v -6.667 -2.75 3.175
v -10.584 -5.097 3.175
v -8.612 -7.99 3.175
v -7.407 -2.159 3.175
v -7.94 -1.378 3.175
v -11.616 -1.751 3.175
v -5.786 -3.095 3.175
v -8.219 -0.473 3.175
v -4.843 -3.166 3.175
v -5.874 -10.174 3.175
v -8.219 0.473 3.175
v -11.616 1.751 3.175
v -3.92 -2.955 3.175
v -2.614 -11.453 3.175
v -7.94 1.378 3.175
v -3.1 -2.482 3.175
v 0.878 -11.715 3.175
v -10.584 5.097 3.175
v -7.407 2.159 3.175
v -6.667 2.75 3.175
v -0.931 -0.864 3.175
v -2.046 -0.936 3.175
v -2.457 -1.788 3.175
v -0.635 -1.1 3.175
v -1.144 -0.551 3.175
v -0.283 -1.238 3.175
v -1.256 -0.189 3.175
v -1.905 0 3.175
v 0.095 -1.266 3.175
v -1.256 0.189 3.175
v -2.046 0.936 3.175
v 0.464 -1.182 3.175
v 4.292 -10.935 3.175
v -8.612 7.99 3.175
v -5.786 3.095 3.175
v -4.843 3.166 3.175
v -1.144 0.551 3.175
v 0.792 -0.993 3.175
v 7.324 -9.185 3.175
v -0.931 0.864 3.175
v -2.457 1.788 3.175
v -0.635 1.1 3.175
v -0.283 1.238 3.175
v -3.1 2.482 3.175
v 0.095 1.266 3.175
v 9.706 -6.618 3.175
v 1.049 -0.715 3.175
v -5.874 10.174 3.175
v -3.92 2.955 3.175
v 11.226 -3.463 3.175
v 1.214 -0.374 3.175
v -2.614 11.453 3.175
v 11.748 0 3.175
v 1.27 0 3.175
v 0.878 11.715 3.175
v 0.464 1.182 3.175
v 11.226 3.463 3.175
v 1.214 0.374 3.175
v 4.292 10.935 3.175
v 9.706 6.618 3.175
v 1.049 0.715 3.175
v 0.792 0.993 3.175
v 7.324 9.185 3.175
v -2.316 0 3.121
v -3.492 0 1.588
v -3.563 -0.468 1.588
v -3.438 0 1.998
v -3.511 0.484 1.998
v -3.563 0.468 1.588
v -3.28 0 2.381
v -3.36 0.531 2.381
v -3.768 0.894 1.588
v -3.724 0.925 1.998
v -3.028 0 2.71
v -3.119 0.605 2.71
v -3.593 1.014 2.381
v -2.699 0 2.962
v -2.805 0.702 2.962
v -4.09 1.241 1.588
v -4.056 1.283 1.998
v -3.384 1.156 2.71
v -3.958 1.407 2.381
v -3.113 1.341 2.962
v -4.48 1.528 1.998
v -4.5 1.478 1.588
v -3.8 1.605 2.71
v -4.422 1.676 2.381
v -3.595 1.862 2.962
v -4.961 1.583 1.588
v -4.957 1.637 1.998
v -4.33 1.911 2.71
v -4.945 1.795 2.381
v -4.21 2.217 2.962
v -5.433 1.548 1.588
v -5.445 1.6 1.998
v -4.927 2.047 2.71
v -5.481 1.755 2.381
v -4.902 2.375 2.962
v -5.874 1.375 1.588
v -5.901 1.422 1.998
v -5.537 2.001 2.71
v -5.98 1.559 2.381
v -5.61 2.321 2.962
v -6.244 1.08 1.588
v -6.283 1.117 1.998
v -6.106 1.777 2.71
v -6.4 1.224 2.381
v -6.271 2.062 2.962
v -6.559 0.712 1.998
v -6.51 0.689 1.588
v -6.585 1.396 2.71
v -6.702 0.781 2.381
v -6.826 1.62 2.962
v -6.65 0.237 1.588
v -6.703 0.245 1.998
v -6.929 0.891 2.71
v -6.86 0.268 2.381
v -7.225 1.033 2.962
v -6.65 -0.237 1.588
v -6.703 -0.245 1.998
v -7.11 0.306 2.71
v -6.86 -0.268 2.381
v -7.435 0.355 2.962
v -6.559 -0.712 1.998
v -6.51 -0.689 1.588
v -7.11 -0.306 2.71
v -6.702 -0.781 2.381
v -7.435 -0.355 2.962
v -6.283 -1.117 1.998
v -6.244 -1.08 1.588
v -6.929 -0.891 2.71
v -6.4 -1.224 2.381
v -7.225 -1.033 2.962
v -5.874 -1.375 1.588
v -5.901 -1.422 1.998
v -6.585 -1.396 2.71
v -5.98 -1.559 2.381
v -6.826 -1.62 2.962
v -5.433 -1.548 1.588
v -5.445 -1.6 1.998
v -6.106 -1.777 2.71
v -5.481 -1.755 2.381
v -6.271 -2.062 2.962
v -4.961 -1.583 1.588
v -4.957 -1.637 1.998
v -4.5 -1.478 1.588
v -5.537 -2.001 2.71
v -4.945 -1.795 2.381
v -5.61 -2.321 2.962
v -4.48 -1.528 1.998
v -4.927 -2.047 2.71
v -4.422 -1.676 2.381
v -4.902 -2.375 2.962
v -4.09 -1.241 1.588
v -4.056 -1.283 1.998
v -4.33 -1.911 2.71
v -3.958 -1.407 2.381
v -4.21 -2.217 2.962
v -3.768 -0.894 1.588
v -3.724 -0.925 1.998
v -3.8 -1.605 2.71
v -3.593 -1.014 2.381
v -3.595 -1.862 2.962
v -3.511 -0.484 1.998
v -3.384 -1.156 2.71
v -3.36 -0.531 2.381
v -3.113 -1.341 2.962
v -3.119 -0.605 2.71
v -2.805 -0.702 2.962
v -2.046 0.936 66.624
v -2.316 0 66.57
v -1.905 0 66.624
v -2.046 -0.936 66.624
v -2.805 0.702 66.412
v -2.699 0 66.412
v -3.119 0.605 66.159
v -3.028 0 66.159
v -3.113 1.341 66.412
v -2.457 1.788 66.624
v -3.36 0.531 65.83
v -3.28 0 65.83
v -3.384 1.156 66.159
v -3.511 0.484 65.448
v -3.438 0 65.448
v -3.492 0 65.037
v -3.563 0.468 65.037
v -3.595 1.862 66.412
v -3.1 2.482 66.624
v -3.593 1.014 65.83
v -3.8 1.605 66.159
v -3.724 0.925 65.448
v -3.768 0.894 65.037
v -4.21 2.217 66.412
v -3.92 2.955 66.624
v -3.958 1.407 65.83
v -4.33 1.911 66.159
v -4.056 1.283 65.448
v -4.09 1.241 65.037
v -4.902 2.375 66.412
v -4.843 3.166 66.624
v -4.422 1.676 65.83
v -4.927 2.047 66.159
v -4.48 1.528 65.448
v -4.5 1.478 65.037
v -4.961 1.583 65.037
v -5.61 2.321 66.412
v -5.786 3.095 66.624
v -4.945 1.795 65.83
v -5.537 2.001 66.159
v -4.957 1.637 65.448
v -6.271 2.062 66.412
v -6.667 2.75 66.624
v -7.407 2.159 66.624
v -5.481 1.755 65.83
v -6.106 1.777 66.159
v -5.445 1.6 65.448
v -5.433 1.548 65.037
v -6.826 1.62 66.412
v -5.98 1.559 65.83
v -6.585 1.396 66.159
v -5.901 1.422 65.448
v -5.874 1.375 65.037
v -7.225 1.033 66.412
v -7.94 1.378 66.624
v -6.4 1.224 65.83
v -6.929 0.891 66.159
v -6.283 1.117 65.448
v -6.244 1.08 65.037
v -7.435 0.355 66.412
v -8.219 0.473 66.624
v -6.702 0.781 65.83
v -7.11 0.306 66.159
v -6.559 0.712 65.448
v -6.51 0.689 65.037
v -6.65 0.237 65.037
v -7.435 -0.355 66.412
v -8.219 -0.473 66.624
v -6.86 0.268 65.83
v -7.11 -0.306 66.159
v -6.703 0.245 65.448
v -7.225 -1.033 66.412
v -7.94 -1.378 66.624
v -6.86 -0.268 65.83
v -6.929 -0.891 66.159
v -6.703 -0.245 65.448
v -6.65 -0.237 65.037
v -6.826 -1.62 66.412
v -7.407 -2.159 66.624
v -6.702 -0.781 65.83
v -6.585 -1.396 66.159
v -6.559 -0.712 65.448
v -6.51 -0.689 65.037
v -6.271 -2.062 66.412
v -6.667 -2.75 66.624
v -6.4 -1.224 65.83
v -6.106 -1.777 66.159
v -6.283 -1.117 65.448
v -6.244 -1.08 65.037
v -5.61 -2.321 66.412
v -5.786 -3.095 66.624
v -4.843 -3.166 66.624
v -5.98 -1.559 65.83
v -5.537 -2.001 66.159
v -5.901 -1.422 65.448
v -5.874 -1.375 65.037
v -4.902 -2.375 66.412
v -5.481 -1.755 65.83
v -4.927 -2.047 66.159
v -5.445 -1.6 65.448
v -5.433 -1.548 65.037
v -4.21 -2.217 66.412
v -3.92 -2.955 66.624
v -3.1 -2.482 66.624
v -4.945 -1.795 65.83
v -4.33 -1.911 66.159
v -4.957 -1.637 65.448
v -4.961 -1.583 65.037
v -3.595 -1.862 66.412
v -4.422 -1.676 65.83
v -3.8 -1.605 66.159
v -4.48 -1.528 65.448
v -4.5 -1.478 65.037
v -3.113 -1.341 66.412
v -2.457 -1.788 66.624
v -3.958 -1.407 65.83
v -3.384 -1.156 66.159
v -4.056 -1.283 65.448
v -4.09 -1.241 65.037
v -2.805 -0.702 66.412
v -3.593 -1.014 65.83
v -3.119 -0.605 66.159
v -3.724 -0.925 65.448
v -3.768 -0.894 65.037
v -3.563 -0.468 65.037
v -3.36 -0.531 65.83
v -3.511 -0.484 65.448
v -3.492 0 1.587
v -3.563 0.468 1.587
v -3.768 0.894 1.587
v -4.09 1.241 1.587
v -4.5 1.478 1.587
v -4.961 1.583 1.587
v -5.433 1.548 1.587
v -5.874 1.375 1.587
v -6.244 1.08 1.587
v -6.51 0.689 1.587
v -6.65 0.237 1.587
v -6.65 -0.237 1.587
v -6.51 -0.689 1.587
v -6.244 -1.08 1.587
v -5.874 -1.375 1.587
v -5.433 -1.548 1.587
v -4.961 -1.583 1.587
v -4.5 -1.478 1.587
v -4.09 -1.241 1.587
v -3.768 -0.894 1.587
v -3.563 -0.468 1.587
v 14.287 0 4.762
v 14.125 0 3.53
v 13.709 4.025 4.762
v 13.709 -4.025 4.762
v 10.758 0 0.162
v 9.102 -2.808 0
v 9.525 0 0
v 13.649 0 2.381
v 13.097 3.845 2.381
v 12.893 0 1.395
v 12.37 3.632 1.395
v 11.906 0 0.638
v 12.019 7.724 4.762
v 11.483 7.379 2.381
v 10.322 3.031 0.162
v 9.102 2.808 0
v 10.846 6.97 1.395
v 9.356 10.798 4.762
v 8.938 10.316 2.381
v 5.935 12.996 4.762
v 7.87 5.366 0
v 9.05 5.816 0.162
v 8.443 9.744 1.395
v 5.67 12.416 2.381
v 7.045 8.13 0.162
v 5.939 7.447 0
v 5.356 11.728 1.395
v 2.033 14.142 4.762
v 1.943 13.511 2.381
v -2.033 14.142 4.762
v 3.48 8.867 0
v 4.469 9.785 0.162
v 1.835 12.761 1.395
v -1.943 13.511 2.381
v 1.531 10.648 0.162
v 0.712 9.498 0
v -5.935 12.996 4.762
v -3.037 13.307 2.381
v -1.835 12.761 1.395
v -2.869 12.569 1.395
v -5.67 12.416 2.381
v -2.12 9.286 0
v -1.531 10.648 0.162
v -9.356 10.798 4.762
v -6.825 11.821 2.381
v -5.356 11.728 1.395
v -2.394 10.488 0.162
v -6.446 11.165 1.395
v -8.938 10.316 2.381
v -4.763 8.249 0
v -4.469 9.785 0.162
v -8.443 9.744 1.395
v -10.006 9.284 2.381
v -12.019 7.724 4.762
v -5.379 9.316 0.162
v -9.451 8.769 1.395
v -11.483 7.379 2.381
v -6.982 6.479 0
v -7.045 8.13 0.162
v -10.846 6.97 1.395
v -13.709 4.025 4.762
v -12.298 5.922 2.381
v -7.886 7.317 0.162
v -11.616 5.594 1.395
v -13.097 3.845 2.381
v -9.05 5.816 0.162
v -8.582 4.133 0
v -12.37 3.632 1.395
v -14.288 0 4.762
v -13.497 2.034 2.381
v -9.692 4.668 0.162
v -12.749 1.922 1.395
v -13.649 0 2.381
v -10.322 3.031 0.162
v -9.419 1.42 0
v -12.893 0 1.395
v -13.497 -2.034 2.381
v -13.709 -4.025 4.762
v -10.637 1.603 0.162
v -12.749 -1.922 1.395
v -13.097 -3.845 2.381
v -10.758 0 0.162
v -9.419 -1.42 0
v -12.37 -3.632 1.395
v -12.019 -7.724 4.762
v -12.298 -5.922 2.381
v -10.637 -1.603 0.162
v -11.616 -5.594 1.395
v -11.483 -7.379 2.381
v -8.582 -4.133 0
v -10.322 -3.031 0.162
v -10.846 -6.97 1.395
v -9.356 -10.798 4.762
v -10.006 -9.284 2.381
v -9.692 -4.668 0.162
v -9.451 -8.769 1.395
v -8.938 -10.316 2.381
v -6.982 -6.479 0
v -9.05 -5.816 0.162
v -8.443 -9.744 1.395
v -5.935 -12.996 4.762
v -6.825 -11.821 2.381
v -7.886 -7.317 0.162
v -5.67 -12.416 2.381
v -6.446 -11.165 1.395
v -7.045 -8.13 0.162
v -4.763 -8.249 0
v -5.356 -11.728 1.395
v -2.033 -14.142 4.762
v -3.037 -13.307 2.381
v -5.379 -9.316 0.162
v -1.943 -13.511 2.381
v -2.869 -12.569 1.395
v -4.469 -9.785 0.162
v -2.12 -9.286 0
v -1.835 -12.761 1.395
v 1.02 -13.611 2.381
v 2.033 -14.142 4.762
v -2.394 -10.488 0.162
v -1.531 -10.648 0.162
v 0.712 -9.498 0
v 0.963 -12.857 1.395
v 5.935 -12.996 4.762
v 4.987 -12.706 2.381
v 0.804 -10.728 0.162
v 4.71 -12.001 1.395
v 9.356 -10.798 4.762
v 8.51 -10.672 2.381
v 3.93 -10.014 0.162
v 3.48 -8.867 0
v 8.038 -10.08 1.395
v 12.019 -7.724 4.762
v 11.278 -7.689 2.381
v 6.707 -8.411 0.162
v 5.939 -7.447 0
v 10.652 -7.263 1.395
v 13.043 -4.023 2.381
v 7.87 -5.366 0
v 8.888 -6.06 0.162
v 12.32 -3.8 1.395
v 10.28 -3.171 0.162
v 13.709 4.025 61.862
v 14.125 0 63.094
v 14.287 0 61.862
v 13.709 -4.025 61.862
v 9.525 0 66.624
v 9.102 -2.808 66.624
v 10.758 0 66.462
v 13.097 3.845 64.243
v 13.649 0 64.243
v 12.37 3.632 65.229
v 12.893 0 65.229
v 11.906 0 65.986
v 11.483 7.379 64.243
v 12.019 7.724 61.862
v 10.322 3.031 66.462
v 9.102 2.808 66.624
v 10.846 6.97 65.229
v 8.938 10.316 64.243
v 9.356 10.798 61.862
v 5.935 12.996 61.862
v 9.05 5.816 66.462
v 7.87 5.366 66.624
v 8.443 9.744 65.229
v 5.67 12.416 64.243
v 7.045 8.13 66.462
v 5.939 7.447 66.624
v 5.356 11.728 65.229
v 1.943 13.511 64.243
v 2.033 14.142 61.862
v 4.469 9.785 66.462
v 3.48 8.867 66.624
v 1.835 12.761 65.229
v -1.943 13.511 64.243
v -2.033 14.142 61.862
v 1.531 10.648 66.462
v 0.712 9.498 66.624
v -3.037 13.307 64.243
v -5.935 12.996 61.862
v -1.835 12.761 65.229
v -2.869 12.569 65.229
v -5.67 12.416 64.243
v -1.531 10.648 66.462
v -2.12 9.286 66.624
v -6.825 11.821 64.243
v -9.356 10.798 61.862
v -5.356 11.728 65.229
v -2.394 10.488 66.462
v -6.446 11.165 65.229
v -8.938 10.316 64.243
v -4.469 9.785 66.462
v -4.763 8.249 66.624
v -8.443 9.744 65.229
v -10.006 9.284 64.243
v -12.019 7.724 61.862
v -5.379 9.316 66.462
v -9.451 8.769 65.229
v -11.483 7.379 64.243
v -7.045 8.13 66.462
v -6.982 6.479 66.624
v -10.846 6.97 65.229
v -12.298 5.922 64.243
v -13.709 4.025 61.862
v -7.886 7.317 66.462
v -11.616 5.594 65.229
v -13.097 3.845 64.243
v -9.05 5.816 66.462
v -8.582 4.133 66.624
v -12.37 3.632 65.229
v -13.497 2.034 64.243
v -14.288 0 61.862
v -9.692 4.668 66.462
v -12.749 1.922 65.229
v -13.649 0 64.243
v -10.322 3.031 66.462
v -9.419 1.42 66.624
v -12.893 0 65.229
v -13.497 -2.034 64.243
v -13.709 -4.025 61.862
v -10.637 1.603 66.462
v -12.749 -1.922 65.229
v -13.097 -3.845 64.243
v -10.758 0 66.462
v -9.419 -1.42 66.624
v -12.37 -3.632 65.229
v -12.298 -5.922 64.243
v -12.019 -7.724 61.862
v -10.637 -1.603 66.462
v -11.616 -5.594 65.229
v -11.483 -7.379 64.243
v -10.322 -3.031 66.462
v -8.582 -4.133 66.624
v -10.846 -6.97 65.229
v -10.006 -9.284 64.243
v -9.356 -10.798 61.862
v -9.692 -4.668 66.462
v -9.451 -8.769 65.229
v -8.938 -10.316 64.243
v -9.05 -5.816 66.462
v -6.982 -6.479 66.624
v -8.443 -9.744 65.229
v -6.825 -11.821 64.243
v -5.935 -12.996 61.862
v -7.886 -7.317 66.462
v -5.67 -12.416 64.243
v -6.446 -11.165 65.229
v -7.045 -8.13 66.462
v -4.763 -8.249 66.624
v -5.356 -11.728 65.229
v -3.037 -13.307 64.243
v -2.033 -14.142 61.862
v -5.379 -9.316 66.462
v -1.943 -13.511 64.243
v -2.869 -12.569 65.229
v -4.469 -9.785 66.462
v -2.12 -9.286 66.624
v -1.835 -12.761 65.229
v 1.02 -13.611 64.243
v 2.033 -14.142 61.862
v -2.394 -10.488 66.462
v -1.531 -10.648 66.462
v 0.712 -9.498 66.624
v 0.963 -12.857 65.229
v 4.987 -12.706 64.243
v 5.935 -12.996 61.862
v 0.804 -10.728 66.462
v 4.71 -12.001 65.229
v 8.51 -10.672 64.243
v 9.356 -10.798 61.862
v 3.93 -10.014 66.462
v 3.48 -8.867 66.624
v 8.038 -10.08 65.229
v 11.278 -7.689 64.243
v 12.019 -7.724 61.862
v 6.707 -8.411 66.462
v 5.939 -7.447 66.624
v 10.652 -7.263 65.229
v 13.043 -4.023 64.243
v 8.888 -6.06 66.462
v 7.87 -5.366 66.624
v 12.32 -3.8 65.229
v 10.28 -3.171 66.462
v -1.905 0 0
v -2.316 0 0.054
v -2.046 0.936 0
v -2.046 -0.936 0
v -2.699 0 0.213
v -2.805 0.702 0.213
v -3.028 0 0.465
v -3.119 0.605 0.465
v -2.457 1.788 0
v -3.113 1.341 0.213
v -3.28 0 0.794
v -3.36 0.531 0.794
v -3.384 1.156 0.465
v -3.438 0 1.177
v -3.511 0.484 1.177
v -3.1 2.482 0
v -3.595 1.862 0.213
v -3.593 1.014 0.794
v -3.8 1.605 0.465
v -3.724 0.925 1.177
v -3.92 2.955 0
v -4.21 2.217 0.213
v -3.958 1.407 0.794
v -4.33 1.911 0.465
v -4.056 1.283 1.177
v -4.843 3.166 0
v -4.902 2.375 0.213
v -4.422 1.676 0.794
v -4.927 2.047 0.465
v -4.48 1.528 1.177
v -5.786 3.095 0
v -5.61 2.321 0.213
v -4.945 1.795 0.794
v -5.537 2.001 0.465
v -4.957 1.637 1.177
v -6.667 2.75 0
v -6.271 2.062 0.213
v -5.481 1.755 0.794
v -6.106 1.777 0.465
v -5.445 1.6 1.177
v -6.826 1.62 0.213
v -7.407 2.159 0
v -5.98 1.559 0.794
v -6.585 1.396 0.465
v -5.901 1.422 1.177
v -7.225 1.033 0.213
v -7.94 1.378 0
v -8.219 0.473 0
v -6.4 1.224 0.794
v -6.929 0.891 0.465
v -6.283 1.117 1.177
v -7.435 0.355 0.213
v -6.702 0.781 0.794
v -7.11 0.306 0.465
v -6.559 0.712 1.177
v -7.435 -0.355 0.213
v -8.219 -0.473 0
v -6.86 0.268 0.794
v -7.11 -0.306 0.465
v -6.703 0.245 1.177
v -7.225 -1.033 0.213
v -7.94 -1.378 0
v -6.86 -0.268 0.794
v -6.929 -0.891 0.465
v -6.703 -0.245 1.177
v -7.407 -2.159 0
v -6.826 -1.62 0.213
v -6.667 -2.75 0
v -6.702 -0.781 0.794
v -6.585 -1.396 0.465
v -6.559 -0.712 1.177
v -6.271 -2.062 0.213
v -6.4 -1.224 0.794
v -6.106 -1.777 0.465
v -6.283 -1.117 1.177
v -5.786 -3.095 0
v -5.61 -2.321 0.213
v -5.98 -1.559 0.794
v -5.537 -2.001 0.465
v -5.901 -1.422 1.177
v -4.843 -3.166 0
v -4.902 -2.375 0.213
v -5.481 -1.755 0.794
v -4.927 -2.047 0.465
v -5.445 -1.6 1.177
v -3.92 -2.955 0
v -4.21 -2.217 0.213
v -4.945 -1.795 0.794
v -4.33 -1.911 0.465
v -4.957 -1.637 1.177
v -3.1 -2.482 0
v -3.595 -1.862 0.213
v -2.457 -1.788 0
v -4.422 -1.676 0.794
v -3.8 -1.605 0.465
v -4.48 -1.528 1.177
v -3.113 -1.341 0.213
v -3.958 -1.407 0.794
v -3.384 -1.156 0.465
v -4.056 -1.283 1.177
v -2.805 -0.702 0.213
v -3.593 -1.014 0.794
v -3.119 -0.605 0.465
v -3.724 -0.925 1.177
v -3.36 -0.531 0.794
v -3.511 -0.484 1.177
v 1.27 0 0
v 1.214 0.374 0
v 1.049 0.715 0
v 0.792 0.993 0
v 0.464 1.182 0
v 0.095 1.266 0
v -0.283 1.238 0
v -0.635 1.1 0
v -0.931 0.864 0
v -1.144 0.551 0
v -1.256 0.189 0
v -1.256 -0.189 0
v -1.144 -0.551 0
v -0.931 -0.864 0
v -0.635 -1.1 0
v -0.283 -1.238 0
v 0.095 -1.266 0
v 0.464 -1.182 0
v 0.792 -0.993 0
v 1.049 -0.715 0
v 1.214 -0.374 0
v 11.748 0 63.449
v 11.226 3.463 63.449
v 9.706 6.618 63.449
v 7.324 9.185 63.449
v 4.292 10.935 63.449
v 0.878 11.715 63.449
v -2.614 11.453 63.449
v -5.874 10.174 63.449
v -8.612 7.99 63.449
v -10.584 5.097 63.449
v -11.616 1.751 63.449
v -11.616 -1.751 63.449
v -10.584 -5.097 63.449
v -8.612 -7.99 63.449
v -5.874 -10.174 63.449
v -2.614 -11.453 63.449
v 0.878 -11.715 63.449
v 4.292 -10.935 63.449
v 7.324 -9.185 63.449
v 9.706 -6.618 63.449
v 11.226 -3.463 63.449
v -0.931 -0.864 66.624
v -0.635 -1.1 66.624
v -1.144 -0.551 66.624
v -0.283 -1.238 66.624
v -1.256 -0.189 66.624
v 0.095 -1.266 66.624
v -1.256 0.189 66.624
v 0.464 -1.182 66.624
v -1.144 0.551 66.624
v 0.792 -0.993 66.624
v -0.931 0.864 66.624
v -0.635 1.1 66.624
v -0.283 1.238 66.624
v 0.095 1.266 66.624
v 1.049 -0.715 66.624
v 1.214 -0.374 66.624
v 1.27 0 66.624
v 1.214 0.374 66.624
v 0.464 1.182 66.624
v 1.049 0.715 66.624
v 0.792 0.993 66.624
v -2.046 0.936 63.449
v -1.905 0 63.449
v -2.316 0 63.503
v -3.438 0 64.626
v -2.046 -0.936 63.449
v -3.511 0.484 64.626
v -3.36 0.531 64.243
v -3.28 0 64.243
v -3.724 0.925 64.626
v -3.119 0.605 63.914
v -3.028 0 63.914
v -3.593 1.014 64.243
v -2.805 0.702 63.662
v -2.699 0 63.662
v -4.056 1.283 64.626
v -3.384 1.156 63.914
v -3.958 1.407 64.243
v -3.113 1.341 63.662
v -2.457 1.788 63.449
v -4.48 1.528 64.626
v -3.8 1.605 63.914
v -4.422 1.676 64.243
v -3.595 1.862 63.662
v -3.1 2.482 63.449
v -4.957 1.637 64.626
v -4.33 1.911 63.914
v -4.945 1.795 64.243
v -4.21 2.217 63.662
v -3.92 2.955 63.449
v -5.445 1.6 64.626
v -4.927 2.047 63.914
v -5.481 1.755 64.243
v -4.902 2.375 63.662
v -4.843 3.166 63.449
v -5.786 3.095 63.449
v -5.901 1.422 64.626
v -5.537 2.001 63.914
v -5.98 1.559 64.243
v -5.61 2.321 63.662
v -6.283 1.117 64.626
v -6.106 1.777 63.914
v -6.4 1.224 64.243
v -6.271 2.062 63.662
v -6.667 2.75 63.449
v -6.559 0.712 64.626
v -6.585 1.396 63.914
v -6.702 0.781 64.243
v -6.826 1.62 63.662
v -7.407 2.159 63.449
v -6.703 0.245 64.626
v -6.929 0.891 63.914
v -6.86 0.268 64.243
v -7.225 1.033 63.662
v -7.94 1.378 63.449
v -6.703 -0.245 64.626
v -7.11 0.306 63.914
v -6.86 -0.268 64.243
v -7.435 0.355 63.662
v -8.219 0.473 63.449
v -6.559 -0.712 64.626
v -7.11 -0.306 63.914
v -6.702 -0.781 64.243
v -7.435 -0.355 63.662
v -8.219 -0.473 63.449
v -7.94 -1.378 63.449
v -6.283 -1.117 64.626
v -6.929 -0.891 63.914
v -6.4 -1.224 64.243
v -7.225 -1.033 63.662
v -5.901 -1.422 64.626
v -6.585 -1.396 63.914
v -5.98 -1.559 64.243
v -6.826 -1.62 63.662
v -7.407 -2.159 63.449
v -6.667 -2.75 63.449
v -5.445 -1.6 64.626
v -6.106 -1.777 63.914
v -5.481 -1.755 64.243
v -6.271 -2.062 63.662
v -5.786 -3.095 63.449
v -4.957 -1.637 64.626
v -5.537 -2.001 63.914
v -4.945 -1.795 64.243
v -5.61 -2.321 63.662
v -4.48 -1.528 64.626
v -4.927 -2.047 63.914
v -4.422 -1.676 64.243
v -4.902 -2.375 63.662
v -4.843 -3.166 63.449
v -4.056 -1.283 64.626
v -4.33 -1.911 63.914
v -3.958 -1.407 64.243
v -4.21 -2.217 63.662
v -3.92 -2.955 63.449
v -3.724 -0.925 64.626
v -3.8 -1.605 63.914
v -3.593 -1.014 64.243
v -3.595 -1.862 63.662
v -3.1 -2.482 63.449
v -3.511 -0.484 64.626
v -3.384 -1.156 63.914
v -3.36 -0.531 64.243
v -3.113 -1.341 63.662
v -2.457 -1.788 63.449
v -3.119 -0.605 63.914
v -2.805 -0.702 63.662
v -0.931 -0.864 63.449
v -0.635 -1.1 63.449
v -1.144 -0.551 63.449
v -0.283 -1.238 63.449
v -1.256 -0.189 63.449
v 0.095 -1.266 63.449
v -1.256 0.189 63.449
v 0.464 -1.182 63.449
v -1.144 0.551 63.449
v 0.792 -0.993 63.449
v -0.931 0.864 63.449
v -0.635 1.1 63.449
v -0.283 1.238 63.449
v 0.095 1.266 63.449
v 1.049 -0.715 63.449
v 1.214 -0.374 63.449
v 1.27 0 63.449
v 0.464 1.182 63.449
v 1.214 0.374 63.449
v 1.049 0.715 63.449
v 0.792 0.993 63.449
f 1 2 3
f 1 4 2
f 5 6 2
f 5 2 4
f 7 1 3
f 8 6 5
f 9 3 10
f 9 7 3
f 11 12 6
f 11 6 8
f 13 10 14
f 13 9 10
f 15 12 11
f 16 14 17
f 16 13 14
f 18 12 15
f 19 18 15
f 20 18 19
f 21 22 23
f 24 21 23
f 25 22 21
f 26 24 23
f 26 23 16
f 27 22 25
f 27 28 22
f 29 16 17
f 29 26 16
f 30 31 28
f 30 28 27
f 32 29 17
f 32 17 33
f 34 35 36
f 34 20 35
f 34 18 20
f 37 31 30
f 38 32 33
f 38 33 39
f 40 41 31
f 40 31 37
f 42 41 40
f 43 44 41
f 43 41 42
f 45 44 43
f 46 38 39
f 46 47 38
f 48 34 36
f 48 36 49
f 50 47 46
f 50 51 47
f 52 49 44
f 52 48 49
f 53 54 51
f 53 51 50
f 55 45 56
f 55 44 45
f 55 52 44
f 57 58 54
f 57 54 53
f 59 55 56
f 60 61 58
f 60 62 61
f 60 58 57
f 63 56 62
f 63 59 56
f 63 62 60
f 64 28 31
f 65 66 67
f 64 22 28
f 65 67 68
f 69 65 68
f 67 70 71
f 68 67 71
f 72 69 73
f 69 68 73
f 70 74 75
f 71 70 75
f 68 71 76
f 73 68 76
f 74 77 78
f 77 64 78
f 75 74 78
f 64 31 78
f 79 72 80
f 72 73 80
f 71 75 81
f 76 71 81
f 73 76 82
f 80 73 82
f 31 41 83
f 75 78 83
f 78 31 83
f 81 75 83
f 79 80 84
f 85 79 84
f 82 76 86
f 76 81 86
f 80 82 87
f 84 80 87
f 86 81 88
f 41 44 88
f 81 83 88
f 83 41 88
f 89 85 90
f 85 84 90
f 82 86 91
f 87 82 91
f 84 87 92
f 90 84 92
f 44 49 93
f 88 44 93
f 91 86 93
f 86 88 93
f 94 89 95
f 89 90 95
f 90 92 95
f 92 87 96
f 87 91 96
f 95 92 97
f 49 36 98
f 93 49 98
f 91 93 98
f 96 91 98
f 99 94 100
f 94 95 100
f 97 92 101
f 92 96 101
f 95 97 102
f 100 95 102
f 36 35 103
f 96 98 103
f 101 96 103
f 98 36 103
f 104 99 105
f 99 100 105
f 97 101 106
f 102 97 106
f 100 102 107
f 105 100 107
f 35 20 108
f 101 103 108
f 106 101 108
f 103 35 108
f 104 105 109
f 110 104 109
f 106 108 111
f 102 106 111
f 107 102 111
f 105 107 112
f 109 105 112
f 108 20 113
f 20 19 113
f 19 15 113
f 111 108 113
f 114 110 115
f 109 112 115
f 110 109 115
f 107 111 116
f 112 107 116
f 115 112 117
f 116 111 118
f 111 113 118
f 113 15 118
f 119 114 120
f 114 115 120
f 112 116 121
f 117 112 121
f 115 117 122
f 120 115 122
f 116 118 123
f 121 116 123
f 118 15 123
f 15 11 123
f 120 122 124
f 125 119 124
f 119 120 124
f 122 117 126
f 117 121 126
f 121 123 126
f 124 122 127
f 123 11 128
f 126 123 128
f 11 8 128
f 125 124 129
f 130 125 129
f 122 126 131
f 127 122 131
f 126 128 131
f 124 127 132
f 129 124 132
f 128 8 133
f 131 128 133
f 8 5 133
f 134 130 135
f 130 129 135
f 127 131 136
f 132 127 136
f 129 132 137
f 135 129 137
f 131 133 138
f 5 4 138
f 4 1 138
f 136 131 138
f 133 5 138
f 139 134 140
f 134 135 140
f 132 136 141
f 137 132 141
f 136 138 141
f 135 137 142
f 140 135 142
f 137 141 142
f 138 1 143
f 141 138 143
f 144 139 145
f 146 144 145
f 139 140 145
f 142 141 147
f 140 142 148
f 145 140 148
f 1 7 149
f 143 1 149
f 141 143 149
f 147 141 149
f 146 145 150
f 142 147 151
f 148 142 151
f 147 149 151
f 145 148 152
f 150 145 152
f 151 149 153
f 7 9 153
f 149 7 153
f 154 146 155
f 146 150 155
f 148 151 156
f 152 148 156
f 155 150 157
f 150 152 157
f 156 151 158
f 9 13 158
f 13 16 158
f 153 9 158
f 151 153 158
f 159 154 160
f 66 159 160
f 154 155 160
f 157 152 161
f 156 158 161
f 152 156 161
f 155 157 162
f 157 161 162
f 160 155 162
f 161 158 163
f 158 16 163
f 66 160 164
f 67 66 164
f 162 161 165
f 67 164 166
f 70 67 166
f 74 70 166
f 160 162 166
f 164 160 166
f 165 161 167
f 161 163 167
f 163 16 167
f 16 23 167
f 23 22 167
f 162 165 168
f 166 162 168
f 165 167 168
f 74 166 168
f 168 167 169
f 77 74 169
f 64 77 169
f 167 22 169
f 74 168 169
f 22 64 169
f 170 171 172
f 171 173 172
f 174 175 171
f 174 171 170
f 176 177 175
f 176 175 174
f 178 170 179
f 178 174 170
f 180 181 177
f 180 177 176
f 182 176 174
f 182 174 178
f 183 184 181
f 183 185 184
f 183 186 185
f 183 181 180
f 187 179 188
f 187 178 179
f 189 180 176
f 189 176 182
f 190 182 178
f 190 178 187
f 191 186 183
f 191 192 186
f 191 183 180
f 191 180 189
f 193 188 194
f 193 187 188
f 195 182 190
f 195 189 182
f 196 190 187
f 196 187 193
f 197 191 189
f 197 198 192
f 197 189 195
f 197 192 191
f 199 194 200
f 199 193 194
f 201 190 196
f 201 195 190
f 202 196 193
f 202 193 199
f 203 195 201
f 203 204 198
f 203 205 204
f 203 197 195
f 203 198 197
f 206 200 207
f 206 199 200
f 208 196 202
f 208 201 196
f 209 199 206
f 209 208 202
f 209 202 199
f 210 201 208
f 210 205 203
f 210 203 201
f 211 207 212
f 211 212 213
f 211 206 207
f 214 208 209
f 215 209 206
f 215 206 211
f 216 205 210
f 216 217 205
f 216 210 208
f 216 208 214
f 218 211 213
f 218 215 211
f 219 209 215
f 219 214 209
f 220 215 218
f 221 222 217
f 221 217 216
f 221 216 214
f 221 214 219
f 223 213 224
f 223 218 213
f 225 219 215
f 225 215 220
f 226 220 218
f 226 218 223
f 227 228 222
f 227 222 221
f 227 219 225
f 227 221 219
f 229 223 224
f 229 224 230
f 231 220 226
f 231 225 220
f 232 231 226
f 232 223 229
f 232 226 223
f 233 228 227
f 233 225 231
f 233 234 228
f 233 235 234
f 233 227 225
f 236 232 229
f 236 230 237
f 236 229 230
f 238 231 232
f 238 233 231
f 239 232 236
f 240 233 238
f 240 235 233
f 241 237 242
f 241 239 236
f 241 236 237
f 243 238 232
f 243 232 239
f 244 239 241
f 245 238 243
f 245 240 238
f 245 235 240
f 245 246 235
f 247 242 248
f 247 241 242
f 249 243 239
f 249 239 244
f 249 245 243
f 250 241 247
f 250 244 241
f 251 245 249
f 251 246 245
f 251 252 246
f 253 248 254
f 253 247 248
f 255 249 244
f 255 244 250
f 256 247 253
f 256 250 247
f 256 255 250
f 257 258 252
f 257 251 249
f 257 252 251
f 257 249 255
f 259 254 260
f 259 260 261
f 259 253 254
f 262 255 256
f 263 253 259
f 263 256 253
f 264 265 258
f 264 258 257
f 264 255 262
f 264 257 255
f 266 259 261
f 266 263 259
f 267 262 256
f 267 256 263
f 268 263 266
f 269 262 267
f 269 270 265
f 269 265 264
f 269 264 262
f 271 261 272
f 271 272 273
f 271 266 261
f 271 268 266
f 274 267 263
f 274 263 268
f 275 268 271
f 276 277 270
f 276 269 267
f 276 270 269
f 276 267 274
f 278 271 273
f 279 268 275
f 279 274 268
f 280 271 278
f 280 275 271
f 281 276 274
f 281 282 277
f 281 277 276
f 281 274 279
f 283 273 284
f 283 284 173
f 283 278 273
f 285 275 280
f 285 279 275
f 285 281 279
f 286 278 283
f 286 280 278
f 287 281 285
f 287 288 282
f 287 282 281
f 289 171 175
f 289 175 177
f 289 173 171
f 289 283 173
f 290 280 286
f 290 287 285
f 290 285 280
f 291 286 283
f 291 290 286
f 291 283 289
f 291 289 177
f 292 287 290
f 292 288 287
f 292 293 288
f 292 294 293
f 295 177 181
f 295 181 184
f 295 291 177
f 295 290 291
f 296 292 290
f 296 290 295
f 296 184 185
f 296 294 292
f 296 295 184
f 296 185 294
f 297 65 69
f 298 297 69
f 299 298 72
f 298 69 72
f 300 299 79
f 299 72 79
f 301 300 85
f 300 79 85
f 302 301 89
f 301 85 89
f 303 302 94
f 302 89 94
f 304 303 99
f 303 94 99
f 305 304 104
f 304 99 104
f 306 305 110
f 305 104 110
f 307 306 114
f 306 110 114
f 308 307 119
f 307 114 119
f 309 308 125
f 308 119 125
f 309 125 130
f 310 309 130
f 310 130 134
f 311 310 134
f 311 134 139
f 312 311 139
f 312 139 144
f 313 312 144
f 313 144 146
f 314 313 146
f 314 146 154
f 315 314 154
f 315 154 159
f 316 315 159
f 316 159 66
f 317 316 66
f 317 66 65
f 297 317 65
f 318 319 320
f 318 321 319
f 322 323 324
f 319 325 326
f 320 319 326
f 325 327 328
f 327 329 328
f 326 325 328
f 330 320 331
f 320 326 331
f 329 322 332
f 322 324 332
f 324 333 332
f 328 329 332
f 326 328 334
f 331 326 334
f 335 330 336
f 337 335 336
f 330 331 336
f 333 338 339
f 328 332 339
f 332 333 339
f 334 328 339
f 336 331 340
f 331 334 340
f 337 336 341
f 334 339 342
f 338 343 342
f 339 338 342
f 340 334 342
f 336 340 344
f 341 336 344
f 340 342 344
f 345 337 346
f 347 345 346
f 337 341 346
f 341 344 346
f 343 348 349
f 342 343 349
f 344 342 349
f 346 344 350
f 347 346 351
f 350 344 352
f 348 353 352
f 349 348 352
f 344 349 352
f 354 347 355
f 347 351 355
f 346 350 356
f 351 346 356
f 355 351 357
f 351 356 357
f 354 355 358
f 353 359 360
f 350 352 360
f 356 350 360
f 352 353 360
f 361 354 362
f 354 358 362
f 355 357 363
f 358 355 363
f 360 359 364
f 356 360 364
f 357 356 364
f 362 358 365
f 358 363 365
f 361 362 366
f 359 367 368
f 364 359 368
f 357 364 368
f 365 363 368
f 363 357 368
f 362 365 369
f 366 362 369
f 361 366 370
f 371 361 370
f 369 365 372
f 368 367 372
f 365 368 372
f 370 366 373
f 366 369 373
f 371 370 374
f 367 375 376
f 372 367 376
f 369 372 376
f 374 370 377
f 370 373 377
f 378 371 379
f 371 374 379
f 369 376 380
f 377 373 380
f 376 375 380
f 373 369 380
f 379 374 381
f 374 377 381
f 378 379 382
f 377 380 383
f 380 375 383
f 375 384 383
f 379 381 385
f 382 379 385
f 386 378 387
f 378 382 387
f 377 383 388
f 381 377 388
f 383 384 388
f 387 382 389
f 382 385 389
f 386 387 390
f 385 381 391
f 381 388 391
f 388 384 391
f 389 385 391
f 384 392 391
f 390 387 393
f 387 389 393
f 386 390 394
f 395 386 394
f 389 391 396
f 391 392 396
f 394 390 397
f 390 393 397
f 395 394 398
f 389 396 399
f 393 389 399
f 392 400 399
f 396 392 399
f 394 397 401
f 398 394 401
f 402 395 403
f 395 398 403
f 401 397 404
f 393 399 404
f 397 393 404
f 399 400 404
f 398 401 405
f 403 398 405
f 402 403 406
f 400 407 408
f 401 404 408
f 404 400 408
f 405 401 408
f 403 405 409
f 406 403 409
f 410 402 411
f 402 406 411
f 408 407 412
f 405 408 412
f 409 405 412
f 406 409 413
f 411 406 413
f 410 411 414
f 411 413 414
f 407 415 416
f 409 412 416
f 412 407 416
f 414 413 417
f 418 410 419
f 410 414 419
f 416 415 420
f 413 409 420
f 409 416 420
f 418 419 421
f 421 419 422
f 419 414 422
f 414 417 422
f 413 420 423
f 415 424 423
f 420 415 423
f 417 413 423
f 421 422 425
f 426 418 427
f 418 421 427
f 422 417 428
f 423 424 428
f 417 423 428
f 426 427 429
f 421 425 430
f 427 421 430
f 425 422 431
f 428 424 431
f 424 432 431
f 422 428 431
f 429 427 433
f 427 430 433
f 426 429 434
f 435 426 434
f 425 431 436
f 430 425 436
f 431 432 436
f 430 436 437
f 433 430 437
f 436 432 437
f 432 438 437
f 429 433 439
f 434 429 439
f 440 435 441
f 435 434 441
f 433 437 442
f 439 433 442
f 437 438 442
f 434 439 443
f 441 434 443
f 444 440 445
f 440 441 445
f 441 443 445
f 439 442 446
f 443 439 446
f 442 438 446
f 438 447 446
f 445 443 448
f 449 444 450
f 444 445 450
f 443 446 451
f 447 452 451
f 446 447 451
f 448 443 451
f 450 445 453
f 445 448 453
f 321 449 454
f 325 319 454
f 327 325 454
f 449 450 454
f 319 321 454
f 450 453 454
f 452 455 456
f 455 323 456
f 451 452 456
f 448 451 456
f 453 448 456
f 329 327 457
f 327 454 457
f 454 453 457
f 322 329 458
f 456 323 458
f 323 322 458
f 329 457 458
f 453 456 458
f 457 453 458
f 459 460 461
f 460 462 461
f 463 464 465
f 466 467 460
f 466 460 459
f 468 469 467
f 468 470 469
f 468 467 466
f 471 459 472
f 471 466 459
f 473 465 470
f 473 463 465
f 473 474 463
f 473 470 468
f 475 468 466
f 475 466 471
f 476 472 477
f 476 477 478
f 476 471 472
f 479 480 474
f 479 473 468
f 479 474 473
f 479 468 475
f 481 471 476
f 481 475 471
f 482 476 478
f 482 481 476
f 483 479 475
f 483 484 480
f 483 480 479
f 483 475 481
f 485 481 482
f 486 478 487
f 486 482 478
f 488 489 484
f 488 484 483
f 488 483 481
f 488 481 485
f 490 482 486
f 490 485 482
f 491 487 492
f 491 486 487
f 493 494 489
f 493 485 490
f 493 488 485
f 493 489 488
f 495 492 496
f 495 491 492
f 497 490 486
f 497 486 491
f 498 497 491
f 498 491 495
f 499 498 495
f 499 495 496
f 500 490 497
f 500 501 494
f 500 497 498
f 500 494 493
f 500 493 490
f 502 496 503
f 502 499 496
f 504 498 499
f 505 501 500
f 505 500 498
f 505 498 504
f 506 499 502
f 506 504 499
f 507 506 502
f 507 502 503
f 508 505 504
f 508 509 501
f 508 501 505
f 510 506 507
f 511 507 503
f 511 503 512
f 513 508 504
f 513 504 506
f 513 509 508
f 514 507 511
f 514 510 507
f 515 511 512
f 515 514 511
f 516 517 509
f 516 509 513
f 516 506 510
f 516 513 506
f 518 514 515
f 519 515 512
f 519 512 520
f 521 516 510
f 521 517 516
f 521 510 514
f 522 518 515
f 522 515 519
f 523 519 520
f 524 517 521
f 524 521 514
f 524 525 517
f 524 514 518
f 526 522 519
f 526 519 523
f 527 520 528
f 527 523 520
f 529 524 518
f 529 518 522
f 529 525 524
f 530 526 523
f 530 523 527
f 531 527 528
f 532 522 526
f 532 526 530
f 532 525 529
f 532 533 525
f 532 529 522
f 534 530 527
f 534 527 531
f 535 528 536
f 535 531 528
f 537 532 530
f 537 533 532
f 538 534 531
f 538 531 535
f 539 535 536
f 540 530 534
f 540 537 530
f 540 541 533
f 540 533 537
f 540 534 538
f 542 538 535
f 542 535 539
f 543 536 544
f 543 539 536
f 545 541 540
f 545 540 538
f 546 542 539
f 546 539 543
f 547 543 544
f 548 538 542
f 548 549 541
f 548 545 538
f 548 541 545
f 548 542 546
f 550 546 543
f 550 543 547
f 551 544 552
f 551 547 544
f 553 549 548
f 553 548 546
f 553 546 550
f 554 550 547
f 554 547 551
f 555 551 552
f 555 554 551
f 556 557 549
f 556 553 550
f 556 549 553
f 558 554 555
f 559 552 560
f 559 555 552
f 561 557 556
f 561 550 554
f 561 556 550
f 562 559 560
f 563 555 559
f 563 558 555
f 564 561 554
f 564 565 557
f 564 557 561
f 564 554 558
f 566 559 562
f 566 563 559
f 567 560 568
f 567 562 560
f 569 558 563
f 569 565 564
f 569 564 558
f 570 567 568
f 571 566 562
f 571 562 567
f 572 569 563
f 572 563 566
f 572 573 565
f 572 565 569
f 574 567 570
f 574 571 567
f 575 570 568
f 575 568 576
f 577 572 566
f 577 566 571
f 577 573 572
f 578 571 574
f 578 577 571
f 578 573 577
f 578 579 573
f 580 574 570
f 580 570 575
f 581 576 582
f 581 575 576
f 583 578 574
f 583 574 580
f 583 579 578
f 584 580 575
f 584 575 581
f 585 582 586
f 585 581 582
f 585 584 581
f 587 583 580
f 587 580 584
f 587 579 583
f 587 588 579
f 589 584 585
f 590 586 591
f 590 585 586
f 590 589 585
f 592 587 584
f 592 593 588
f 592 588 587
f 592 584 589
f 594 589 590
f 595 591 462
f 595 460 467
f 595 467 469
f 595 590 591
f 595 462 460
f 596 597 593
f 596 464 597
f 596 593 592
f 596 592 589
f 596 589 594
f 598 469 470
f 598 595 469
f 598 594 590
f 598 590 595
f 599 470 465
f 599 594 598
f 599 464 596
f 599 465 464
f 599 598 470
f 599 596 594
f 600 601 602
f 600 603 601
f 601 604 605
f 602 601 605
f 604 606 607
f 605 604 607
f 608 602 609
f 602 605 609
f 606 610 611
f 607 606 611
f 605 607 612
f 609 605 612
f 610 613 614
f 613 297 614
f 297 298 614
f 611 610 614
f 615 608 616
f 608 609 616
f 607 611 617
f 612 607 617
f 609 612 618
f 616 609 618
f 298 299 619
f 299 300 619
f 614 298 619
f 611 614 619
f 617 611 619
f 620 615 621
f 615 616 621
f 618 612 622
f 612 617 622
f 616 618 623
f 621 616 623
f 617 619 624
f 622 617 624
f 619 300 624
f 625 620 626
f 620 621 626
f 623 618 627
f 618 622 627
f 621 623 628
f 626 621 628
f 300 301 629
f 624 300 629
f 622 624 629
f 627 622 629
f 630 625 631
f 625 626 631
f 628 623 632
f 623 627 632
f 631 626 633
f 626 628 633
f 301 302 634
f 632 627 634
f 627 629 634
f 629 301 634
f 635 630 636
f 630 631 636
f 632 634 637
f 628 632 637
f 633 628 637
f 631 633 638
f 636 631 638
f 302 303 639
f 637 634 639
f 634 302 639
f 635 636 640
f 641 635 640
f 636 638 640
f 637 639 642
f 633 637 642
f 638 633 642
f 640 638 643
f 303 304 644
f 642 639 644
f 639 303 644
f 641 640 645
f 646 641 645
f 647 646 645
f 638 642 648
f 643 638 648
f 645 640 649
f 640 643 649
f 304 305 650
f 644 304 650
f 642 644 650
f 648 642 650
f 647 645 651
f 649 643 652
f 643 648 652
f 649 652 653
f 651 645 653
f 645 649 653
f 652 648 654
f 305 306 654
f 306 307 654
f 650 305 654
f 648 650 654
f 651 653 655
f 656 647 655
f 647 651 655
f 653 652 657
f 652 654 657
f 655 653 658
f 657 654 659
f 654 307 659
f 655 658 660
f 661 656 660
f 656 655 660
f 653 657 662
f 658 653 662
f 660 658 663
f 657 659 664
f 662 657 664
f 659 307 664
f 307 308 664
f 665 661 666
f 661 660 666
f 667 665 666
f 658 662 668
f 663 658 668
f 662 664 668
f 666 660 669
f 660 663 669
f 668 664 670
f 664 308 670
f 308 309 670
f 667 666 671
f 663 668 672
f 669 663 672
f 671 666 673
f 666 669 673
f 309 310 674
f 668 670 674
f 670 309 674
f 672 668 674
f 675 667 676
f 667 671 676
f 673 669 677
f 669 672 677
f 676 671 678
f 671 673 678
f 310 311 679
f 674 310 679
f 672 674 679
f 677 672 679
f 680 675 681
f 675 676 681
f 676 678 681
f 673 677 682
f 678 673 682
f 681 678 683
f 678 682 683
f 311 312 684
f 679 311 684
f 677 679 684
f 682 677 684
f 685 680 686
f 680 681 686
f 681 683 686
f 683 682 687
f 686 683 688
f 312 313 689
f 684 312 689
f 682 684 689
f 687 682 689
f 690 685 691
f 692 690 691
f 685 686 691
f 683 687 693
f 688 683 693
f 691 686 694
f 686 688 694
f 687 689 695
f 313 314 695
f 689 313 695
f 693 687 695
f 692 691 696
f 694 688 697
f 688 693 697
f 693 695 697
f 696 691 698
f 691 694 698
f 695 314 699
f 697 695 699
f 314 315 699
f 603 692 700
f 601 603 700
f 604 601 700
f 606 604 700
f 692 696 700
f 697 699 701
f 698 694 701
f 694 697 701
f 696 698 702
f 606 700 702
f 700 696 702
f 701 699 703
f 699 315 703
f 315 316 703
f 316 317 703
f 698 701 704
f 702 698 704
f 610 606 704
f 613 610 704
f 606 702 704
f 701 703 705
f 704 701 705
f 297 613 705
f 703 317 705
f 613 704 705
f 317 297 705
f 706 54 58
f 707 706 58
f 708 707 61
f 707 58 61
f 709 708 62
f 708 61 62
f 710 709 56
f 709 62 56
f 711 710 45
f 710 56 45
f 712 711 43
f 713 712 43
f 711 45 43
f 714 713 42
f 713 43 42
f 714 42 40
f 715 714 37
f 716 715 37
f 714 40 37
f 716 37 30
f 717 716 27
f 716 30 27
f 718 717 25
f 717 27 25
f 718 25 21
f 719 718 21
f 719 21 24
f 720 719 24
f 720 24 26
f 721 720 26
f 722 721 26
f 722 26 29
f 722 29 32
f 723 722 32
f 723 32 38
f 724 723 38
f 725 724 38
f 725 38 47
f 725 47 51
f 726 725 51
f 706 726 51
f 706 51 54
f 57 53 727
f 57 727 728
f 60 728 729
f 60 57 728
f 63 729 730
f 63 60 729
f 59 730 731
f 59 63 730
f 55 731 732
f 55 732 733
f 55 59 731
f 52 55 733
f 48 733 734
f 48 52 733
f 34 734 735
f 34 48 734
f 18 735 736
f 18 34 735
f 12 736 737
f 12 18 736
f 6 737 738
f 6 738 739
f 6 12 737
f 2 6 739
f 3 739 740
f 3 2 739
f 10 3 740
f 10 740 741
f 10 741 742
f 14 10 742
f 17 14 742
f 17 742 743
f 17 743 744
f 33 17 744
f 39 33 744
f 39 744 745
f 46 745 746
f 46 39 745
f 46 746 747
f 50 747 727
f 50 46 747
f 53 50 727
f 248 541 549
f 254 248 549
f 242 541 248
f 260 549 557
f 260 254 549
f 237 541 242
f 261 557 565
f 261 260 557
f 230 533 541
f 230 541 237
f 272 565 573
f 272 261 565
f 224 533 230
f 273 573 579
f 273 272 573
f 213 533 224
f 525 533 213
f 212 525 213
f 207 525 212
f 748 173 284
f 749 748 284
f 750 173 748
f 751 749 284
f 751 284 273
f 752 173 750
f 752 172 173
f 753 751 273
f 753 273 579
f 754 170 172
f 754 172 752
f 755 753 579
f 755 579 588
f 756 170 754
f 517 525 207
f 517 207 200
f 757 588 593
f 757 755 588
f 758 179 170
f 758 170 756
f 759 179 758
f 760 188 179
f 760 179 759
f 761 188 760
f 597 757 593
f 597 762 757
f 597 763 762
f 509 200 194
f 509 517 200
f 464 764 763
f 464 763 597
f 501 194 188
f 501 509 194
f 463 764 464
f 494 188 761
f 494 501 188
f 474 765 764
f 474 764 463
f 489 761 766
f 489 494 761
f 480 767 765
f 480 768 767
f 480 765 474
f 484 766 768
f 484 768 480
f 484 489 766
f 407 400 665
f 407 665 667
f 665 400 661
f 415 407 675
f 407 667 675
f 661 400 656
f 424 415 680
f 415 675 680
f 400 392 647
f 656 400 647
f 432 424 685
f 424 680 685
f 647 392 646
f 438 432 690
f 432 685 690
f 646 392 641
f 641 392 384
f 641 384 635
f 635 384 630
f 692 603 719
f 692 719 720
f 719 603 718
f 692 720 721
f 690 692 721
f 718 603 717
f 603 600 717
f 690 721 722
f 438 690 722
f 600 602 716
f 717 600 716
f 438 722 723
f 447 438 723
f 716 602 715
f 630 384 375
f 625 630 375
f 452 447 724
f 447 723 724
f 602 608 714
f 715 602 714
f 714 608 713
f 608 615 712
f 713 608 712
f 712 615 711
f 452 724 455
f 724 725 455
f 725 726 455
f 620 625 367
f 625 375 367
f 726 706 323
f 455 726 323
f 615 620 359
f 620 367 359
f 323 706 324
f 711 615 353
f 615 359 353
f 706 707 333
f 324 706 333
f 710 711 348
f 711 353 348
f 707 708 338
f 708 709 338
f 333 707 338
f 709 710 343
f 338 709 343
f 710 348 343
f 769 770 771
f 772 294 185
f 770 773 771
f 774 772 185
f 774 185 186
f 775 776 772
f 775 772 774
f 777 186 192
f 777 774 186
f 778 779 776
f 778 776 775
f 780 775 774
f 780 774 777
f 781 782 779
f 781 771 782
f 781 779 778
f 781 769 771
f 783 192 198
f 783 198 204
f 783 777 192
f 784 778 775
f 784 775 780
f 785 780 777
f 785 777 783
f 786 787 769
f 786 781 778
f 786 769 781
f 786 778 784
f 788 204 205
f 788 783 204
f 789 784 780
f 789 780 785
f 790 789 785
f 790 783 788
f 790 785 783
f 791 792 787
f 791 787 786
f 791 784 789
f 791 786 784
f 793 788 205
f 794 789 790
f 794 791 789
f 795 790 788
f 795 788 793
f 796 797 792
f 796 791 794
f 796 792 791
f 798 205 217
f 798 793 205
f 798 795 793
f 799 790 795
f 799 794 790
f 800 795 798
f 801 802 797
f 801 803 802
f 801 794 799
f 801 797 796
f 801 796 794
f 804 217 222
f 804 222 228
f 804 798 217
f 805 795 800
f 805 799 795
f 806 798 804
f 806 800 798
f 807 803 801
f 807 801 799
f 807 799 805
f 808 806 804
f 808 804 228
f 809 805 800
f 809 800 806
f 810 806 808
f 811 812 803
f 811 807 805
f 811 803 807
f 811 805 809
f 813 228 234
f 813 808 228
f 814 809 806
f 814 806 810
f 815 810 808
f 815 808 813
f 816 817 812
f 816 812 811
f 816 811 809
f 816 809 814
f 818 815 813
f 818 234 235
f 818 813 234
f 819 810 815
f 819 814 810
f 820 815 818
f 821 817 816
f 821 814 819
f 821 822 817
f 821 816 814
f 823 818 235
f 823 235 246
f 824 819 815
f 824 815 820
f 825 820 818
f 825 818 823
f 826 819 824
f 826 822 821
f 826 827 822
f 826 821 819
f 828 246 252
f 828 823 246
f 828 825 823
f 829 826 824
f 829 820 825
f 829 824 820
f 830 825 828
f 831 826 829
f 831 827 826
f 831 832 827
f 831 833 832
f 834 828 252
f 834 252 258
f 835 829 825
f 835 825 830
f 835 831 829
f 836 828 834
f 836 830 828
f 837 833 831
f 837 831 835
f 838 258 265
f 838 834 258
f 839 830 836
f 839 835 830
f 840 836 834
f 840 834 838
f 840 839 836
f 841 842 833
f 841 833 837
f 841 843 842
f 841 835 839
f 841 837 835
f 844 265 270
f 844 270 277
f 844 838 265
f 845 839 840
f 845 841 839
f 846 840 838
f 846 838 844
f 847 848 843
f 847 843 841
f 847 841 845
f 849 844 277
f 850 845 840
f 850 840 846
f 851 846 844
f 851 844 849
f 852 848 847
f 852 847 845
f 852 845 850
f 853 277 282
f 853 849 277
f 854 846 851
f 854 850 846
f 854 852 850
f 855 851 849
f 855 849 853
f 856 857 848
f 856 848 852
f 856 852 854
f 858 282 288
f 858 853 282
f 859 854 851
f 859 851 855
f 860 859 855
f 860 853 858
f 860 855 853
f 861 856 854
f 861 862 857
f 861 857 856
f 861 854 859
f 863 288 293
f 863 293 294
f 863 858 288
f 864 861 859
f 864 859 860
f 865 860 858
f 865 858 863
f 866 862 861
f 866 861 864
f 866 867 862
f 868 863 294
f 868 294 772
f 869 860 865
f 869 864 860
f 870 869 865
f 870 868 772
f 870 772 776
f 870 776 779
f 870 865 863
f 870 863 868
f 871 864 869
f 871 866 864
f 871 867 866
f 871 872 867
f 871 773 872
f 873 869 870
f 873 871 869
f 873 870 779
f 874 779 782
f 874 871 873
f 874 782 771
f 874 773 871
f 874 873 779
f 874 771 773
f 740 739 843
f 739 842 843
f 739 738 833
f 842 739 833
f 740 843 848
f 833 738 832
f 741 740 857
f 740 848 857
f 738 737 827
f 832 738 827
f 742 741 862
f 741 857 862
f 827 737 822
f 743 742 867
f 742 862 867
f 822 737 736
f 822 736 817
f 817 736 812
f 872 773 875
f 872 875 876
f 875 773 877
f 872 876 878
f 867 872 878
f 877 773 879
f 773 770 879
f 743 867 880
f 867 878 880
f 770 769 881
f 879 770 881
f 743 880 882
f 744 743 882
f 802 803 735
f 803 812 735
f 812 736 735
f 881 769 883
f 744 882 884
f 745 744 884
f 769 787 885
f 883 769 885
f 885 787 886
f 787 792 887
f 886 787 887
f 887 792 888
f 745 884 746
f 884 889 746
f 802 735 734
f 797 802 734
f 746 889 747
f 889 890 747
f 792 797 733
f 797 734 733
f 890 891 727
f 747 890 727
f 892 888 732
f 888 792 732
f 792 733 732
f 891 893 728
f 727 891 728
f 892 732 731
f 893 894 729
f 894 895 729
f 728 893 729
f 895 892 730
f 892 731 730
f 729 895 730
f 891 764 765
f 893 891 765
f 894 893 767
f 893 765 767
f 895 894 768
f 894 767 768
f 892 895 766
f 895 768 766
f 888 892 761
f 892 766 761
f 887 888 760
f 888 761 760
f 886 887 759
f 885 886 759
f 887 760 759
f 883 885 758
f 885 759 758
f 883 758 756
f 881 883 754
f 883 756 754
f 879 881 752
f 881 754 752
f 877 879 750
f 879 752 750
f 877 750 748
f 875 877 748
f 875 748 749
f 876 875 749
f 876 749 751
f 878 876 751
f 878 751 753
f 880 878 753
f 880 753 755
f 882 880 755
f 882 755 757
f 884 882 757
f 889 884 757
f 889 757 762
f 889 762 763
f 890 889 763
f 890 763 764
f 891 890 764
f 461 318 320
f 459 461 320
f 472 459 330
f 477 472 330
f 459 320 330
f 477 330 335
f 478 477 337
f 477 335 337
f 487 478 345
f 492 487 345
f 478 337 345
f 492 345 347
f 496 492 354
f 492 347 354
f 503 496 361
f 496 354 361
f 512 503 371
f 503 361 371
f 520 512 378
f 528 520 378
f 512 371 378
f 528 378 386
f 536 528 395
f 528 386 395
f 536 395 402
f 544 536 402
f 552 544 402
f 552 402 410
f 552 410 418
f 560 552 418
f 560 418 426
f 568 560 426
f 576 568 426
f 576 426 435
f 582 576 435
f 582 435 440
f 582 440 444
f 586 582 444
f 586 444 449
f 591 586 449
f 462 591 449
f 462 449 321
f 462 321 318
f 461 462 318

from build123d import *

# Parameters (mm, degrees)
SKETCH2_R           = 14.2875
BOSS_EXTRUDE1_DEPTH = 3.175
SKETCH3_R           = 14.2875
SKETCH3_R_2         = 11.7475
BOSS_EXTRUDE2_DEPTH = 60.2742
SKETCH4_R           = 14.2875
BOSS_EXTRUDE3_DEPTH = 3.175
SKETCH5_R           = 1.27
SKETCH5_R_2         = 1.5875
CUT_EXTRUDE1_DEPTH  = 70.620753645
FILLET1_R           = 4.7625
FILLET2_R           = 1.5875


with BuildPart() as part:
    # Sketch2 → Boss-Extrude1 (new body)
    with BuildSketch(Plane.XY):
        Circle(SKETCH2_R)
    extrude(amount=BOSS_EXTRUDE1_DEPTH)

    # Sketch3 → Boss-Extrude2 (add)
    with BuildSketch(Plane.XY.offset(3.175)):
        Circle(SKETCH3_R)
        Circle(SKETCH3_R_2, mode=Mode.SUBTRACT)
    extrude(amount=BOSS_EXTRUDE2_DEPTH)

    # Sketch4 → Boss-Extrude3 (add)
    with BuildSketch(Plane.XY.offset(63.4492)):
        Circle(SKETCH4_R)
    extrude(amount=BOSS_EXTRUDE3_DEPTH)

    # Sketch5 → Cut-Extrude1 (cut, through all)
    with BuildSketch(Plane.XY.offset(66.6242)):
        Circle(SKETCH5_R)
        with Locations((-5.08, 0)):
            Circle(SKETCH5_R_2)
    extrude(amount=-CUT_EXTRUDE1_DEPTH, mode=Mode.SUBTRACT)

    # Fillet1
    fillet1_edges = [part.edges().sort_by_distance(p)[0] for p in [
        (-14.2875, 0, 66.6242),
        (-14.2875, 0, 0),
    ]]
    fillet(fillet1_edges, radius=FILLET1_R)

    # Fillet2
    fillet2_edges = [part.edges().sort_by_distance(p)[0] for p in [
        (-6.6675, 0, 3.175),
        (-6.6675, 0, 63.4492),
        (-6.6675, 0, 0),
        (-6.6675, 0, 66.6242),
    ]]
    fillet(fillet2_edges, radius=FILLET2_R - 0.0001)  # a hair under: the kernel refuses the full size


solid = part.part
